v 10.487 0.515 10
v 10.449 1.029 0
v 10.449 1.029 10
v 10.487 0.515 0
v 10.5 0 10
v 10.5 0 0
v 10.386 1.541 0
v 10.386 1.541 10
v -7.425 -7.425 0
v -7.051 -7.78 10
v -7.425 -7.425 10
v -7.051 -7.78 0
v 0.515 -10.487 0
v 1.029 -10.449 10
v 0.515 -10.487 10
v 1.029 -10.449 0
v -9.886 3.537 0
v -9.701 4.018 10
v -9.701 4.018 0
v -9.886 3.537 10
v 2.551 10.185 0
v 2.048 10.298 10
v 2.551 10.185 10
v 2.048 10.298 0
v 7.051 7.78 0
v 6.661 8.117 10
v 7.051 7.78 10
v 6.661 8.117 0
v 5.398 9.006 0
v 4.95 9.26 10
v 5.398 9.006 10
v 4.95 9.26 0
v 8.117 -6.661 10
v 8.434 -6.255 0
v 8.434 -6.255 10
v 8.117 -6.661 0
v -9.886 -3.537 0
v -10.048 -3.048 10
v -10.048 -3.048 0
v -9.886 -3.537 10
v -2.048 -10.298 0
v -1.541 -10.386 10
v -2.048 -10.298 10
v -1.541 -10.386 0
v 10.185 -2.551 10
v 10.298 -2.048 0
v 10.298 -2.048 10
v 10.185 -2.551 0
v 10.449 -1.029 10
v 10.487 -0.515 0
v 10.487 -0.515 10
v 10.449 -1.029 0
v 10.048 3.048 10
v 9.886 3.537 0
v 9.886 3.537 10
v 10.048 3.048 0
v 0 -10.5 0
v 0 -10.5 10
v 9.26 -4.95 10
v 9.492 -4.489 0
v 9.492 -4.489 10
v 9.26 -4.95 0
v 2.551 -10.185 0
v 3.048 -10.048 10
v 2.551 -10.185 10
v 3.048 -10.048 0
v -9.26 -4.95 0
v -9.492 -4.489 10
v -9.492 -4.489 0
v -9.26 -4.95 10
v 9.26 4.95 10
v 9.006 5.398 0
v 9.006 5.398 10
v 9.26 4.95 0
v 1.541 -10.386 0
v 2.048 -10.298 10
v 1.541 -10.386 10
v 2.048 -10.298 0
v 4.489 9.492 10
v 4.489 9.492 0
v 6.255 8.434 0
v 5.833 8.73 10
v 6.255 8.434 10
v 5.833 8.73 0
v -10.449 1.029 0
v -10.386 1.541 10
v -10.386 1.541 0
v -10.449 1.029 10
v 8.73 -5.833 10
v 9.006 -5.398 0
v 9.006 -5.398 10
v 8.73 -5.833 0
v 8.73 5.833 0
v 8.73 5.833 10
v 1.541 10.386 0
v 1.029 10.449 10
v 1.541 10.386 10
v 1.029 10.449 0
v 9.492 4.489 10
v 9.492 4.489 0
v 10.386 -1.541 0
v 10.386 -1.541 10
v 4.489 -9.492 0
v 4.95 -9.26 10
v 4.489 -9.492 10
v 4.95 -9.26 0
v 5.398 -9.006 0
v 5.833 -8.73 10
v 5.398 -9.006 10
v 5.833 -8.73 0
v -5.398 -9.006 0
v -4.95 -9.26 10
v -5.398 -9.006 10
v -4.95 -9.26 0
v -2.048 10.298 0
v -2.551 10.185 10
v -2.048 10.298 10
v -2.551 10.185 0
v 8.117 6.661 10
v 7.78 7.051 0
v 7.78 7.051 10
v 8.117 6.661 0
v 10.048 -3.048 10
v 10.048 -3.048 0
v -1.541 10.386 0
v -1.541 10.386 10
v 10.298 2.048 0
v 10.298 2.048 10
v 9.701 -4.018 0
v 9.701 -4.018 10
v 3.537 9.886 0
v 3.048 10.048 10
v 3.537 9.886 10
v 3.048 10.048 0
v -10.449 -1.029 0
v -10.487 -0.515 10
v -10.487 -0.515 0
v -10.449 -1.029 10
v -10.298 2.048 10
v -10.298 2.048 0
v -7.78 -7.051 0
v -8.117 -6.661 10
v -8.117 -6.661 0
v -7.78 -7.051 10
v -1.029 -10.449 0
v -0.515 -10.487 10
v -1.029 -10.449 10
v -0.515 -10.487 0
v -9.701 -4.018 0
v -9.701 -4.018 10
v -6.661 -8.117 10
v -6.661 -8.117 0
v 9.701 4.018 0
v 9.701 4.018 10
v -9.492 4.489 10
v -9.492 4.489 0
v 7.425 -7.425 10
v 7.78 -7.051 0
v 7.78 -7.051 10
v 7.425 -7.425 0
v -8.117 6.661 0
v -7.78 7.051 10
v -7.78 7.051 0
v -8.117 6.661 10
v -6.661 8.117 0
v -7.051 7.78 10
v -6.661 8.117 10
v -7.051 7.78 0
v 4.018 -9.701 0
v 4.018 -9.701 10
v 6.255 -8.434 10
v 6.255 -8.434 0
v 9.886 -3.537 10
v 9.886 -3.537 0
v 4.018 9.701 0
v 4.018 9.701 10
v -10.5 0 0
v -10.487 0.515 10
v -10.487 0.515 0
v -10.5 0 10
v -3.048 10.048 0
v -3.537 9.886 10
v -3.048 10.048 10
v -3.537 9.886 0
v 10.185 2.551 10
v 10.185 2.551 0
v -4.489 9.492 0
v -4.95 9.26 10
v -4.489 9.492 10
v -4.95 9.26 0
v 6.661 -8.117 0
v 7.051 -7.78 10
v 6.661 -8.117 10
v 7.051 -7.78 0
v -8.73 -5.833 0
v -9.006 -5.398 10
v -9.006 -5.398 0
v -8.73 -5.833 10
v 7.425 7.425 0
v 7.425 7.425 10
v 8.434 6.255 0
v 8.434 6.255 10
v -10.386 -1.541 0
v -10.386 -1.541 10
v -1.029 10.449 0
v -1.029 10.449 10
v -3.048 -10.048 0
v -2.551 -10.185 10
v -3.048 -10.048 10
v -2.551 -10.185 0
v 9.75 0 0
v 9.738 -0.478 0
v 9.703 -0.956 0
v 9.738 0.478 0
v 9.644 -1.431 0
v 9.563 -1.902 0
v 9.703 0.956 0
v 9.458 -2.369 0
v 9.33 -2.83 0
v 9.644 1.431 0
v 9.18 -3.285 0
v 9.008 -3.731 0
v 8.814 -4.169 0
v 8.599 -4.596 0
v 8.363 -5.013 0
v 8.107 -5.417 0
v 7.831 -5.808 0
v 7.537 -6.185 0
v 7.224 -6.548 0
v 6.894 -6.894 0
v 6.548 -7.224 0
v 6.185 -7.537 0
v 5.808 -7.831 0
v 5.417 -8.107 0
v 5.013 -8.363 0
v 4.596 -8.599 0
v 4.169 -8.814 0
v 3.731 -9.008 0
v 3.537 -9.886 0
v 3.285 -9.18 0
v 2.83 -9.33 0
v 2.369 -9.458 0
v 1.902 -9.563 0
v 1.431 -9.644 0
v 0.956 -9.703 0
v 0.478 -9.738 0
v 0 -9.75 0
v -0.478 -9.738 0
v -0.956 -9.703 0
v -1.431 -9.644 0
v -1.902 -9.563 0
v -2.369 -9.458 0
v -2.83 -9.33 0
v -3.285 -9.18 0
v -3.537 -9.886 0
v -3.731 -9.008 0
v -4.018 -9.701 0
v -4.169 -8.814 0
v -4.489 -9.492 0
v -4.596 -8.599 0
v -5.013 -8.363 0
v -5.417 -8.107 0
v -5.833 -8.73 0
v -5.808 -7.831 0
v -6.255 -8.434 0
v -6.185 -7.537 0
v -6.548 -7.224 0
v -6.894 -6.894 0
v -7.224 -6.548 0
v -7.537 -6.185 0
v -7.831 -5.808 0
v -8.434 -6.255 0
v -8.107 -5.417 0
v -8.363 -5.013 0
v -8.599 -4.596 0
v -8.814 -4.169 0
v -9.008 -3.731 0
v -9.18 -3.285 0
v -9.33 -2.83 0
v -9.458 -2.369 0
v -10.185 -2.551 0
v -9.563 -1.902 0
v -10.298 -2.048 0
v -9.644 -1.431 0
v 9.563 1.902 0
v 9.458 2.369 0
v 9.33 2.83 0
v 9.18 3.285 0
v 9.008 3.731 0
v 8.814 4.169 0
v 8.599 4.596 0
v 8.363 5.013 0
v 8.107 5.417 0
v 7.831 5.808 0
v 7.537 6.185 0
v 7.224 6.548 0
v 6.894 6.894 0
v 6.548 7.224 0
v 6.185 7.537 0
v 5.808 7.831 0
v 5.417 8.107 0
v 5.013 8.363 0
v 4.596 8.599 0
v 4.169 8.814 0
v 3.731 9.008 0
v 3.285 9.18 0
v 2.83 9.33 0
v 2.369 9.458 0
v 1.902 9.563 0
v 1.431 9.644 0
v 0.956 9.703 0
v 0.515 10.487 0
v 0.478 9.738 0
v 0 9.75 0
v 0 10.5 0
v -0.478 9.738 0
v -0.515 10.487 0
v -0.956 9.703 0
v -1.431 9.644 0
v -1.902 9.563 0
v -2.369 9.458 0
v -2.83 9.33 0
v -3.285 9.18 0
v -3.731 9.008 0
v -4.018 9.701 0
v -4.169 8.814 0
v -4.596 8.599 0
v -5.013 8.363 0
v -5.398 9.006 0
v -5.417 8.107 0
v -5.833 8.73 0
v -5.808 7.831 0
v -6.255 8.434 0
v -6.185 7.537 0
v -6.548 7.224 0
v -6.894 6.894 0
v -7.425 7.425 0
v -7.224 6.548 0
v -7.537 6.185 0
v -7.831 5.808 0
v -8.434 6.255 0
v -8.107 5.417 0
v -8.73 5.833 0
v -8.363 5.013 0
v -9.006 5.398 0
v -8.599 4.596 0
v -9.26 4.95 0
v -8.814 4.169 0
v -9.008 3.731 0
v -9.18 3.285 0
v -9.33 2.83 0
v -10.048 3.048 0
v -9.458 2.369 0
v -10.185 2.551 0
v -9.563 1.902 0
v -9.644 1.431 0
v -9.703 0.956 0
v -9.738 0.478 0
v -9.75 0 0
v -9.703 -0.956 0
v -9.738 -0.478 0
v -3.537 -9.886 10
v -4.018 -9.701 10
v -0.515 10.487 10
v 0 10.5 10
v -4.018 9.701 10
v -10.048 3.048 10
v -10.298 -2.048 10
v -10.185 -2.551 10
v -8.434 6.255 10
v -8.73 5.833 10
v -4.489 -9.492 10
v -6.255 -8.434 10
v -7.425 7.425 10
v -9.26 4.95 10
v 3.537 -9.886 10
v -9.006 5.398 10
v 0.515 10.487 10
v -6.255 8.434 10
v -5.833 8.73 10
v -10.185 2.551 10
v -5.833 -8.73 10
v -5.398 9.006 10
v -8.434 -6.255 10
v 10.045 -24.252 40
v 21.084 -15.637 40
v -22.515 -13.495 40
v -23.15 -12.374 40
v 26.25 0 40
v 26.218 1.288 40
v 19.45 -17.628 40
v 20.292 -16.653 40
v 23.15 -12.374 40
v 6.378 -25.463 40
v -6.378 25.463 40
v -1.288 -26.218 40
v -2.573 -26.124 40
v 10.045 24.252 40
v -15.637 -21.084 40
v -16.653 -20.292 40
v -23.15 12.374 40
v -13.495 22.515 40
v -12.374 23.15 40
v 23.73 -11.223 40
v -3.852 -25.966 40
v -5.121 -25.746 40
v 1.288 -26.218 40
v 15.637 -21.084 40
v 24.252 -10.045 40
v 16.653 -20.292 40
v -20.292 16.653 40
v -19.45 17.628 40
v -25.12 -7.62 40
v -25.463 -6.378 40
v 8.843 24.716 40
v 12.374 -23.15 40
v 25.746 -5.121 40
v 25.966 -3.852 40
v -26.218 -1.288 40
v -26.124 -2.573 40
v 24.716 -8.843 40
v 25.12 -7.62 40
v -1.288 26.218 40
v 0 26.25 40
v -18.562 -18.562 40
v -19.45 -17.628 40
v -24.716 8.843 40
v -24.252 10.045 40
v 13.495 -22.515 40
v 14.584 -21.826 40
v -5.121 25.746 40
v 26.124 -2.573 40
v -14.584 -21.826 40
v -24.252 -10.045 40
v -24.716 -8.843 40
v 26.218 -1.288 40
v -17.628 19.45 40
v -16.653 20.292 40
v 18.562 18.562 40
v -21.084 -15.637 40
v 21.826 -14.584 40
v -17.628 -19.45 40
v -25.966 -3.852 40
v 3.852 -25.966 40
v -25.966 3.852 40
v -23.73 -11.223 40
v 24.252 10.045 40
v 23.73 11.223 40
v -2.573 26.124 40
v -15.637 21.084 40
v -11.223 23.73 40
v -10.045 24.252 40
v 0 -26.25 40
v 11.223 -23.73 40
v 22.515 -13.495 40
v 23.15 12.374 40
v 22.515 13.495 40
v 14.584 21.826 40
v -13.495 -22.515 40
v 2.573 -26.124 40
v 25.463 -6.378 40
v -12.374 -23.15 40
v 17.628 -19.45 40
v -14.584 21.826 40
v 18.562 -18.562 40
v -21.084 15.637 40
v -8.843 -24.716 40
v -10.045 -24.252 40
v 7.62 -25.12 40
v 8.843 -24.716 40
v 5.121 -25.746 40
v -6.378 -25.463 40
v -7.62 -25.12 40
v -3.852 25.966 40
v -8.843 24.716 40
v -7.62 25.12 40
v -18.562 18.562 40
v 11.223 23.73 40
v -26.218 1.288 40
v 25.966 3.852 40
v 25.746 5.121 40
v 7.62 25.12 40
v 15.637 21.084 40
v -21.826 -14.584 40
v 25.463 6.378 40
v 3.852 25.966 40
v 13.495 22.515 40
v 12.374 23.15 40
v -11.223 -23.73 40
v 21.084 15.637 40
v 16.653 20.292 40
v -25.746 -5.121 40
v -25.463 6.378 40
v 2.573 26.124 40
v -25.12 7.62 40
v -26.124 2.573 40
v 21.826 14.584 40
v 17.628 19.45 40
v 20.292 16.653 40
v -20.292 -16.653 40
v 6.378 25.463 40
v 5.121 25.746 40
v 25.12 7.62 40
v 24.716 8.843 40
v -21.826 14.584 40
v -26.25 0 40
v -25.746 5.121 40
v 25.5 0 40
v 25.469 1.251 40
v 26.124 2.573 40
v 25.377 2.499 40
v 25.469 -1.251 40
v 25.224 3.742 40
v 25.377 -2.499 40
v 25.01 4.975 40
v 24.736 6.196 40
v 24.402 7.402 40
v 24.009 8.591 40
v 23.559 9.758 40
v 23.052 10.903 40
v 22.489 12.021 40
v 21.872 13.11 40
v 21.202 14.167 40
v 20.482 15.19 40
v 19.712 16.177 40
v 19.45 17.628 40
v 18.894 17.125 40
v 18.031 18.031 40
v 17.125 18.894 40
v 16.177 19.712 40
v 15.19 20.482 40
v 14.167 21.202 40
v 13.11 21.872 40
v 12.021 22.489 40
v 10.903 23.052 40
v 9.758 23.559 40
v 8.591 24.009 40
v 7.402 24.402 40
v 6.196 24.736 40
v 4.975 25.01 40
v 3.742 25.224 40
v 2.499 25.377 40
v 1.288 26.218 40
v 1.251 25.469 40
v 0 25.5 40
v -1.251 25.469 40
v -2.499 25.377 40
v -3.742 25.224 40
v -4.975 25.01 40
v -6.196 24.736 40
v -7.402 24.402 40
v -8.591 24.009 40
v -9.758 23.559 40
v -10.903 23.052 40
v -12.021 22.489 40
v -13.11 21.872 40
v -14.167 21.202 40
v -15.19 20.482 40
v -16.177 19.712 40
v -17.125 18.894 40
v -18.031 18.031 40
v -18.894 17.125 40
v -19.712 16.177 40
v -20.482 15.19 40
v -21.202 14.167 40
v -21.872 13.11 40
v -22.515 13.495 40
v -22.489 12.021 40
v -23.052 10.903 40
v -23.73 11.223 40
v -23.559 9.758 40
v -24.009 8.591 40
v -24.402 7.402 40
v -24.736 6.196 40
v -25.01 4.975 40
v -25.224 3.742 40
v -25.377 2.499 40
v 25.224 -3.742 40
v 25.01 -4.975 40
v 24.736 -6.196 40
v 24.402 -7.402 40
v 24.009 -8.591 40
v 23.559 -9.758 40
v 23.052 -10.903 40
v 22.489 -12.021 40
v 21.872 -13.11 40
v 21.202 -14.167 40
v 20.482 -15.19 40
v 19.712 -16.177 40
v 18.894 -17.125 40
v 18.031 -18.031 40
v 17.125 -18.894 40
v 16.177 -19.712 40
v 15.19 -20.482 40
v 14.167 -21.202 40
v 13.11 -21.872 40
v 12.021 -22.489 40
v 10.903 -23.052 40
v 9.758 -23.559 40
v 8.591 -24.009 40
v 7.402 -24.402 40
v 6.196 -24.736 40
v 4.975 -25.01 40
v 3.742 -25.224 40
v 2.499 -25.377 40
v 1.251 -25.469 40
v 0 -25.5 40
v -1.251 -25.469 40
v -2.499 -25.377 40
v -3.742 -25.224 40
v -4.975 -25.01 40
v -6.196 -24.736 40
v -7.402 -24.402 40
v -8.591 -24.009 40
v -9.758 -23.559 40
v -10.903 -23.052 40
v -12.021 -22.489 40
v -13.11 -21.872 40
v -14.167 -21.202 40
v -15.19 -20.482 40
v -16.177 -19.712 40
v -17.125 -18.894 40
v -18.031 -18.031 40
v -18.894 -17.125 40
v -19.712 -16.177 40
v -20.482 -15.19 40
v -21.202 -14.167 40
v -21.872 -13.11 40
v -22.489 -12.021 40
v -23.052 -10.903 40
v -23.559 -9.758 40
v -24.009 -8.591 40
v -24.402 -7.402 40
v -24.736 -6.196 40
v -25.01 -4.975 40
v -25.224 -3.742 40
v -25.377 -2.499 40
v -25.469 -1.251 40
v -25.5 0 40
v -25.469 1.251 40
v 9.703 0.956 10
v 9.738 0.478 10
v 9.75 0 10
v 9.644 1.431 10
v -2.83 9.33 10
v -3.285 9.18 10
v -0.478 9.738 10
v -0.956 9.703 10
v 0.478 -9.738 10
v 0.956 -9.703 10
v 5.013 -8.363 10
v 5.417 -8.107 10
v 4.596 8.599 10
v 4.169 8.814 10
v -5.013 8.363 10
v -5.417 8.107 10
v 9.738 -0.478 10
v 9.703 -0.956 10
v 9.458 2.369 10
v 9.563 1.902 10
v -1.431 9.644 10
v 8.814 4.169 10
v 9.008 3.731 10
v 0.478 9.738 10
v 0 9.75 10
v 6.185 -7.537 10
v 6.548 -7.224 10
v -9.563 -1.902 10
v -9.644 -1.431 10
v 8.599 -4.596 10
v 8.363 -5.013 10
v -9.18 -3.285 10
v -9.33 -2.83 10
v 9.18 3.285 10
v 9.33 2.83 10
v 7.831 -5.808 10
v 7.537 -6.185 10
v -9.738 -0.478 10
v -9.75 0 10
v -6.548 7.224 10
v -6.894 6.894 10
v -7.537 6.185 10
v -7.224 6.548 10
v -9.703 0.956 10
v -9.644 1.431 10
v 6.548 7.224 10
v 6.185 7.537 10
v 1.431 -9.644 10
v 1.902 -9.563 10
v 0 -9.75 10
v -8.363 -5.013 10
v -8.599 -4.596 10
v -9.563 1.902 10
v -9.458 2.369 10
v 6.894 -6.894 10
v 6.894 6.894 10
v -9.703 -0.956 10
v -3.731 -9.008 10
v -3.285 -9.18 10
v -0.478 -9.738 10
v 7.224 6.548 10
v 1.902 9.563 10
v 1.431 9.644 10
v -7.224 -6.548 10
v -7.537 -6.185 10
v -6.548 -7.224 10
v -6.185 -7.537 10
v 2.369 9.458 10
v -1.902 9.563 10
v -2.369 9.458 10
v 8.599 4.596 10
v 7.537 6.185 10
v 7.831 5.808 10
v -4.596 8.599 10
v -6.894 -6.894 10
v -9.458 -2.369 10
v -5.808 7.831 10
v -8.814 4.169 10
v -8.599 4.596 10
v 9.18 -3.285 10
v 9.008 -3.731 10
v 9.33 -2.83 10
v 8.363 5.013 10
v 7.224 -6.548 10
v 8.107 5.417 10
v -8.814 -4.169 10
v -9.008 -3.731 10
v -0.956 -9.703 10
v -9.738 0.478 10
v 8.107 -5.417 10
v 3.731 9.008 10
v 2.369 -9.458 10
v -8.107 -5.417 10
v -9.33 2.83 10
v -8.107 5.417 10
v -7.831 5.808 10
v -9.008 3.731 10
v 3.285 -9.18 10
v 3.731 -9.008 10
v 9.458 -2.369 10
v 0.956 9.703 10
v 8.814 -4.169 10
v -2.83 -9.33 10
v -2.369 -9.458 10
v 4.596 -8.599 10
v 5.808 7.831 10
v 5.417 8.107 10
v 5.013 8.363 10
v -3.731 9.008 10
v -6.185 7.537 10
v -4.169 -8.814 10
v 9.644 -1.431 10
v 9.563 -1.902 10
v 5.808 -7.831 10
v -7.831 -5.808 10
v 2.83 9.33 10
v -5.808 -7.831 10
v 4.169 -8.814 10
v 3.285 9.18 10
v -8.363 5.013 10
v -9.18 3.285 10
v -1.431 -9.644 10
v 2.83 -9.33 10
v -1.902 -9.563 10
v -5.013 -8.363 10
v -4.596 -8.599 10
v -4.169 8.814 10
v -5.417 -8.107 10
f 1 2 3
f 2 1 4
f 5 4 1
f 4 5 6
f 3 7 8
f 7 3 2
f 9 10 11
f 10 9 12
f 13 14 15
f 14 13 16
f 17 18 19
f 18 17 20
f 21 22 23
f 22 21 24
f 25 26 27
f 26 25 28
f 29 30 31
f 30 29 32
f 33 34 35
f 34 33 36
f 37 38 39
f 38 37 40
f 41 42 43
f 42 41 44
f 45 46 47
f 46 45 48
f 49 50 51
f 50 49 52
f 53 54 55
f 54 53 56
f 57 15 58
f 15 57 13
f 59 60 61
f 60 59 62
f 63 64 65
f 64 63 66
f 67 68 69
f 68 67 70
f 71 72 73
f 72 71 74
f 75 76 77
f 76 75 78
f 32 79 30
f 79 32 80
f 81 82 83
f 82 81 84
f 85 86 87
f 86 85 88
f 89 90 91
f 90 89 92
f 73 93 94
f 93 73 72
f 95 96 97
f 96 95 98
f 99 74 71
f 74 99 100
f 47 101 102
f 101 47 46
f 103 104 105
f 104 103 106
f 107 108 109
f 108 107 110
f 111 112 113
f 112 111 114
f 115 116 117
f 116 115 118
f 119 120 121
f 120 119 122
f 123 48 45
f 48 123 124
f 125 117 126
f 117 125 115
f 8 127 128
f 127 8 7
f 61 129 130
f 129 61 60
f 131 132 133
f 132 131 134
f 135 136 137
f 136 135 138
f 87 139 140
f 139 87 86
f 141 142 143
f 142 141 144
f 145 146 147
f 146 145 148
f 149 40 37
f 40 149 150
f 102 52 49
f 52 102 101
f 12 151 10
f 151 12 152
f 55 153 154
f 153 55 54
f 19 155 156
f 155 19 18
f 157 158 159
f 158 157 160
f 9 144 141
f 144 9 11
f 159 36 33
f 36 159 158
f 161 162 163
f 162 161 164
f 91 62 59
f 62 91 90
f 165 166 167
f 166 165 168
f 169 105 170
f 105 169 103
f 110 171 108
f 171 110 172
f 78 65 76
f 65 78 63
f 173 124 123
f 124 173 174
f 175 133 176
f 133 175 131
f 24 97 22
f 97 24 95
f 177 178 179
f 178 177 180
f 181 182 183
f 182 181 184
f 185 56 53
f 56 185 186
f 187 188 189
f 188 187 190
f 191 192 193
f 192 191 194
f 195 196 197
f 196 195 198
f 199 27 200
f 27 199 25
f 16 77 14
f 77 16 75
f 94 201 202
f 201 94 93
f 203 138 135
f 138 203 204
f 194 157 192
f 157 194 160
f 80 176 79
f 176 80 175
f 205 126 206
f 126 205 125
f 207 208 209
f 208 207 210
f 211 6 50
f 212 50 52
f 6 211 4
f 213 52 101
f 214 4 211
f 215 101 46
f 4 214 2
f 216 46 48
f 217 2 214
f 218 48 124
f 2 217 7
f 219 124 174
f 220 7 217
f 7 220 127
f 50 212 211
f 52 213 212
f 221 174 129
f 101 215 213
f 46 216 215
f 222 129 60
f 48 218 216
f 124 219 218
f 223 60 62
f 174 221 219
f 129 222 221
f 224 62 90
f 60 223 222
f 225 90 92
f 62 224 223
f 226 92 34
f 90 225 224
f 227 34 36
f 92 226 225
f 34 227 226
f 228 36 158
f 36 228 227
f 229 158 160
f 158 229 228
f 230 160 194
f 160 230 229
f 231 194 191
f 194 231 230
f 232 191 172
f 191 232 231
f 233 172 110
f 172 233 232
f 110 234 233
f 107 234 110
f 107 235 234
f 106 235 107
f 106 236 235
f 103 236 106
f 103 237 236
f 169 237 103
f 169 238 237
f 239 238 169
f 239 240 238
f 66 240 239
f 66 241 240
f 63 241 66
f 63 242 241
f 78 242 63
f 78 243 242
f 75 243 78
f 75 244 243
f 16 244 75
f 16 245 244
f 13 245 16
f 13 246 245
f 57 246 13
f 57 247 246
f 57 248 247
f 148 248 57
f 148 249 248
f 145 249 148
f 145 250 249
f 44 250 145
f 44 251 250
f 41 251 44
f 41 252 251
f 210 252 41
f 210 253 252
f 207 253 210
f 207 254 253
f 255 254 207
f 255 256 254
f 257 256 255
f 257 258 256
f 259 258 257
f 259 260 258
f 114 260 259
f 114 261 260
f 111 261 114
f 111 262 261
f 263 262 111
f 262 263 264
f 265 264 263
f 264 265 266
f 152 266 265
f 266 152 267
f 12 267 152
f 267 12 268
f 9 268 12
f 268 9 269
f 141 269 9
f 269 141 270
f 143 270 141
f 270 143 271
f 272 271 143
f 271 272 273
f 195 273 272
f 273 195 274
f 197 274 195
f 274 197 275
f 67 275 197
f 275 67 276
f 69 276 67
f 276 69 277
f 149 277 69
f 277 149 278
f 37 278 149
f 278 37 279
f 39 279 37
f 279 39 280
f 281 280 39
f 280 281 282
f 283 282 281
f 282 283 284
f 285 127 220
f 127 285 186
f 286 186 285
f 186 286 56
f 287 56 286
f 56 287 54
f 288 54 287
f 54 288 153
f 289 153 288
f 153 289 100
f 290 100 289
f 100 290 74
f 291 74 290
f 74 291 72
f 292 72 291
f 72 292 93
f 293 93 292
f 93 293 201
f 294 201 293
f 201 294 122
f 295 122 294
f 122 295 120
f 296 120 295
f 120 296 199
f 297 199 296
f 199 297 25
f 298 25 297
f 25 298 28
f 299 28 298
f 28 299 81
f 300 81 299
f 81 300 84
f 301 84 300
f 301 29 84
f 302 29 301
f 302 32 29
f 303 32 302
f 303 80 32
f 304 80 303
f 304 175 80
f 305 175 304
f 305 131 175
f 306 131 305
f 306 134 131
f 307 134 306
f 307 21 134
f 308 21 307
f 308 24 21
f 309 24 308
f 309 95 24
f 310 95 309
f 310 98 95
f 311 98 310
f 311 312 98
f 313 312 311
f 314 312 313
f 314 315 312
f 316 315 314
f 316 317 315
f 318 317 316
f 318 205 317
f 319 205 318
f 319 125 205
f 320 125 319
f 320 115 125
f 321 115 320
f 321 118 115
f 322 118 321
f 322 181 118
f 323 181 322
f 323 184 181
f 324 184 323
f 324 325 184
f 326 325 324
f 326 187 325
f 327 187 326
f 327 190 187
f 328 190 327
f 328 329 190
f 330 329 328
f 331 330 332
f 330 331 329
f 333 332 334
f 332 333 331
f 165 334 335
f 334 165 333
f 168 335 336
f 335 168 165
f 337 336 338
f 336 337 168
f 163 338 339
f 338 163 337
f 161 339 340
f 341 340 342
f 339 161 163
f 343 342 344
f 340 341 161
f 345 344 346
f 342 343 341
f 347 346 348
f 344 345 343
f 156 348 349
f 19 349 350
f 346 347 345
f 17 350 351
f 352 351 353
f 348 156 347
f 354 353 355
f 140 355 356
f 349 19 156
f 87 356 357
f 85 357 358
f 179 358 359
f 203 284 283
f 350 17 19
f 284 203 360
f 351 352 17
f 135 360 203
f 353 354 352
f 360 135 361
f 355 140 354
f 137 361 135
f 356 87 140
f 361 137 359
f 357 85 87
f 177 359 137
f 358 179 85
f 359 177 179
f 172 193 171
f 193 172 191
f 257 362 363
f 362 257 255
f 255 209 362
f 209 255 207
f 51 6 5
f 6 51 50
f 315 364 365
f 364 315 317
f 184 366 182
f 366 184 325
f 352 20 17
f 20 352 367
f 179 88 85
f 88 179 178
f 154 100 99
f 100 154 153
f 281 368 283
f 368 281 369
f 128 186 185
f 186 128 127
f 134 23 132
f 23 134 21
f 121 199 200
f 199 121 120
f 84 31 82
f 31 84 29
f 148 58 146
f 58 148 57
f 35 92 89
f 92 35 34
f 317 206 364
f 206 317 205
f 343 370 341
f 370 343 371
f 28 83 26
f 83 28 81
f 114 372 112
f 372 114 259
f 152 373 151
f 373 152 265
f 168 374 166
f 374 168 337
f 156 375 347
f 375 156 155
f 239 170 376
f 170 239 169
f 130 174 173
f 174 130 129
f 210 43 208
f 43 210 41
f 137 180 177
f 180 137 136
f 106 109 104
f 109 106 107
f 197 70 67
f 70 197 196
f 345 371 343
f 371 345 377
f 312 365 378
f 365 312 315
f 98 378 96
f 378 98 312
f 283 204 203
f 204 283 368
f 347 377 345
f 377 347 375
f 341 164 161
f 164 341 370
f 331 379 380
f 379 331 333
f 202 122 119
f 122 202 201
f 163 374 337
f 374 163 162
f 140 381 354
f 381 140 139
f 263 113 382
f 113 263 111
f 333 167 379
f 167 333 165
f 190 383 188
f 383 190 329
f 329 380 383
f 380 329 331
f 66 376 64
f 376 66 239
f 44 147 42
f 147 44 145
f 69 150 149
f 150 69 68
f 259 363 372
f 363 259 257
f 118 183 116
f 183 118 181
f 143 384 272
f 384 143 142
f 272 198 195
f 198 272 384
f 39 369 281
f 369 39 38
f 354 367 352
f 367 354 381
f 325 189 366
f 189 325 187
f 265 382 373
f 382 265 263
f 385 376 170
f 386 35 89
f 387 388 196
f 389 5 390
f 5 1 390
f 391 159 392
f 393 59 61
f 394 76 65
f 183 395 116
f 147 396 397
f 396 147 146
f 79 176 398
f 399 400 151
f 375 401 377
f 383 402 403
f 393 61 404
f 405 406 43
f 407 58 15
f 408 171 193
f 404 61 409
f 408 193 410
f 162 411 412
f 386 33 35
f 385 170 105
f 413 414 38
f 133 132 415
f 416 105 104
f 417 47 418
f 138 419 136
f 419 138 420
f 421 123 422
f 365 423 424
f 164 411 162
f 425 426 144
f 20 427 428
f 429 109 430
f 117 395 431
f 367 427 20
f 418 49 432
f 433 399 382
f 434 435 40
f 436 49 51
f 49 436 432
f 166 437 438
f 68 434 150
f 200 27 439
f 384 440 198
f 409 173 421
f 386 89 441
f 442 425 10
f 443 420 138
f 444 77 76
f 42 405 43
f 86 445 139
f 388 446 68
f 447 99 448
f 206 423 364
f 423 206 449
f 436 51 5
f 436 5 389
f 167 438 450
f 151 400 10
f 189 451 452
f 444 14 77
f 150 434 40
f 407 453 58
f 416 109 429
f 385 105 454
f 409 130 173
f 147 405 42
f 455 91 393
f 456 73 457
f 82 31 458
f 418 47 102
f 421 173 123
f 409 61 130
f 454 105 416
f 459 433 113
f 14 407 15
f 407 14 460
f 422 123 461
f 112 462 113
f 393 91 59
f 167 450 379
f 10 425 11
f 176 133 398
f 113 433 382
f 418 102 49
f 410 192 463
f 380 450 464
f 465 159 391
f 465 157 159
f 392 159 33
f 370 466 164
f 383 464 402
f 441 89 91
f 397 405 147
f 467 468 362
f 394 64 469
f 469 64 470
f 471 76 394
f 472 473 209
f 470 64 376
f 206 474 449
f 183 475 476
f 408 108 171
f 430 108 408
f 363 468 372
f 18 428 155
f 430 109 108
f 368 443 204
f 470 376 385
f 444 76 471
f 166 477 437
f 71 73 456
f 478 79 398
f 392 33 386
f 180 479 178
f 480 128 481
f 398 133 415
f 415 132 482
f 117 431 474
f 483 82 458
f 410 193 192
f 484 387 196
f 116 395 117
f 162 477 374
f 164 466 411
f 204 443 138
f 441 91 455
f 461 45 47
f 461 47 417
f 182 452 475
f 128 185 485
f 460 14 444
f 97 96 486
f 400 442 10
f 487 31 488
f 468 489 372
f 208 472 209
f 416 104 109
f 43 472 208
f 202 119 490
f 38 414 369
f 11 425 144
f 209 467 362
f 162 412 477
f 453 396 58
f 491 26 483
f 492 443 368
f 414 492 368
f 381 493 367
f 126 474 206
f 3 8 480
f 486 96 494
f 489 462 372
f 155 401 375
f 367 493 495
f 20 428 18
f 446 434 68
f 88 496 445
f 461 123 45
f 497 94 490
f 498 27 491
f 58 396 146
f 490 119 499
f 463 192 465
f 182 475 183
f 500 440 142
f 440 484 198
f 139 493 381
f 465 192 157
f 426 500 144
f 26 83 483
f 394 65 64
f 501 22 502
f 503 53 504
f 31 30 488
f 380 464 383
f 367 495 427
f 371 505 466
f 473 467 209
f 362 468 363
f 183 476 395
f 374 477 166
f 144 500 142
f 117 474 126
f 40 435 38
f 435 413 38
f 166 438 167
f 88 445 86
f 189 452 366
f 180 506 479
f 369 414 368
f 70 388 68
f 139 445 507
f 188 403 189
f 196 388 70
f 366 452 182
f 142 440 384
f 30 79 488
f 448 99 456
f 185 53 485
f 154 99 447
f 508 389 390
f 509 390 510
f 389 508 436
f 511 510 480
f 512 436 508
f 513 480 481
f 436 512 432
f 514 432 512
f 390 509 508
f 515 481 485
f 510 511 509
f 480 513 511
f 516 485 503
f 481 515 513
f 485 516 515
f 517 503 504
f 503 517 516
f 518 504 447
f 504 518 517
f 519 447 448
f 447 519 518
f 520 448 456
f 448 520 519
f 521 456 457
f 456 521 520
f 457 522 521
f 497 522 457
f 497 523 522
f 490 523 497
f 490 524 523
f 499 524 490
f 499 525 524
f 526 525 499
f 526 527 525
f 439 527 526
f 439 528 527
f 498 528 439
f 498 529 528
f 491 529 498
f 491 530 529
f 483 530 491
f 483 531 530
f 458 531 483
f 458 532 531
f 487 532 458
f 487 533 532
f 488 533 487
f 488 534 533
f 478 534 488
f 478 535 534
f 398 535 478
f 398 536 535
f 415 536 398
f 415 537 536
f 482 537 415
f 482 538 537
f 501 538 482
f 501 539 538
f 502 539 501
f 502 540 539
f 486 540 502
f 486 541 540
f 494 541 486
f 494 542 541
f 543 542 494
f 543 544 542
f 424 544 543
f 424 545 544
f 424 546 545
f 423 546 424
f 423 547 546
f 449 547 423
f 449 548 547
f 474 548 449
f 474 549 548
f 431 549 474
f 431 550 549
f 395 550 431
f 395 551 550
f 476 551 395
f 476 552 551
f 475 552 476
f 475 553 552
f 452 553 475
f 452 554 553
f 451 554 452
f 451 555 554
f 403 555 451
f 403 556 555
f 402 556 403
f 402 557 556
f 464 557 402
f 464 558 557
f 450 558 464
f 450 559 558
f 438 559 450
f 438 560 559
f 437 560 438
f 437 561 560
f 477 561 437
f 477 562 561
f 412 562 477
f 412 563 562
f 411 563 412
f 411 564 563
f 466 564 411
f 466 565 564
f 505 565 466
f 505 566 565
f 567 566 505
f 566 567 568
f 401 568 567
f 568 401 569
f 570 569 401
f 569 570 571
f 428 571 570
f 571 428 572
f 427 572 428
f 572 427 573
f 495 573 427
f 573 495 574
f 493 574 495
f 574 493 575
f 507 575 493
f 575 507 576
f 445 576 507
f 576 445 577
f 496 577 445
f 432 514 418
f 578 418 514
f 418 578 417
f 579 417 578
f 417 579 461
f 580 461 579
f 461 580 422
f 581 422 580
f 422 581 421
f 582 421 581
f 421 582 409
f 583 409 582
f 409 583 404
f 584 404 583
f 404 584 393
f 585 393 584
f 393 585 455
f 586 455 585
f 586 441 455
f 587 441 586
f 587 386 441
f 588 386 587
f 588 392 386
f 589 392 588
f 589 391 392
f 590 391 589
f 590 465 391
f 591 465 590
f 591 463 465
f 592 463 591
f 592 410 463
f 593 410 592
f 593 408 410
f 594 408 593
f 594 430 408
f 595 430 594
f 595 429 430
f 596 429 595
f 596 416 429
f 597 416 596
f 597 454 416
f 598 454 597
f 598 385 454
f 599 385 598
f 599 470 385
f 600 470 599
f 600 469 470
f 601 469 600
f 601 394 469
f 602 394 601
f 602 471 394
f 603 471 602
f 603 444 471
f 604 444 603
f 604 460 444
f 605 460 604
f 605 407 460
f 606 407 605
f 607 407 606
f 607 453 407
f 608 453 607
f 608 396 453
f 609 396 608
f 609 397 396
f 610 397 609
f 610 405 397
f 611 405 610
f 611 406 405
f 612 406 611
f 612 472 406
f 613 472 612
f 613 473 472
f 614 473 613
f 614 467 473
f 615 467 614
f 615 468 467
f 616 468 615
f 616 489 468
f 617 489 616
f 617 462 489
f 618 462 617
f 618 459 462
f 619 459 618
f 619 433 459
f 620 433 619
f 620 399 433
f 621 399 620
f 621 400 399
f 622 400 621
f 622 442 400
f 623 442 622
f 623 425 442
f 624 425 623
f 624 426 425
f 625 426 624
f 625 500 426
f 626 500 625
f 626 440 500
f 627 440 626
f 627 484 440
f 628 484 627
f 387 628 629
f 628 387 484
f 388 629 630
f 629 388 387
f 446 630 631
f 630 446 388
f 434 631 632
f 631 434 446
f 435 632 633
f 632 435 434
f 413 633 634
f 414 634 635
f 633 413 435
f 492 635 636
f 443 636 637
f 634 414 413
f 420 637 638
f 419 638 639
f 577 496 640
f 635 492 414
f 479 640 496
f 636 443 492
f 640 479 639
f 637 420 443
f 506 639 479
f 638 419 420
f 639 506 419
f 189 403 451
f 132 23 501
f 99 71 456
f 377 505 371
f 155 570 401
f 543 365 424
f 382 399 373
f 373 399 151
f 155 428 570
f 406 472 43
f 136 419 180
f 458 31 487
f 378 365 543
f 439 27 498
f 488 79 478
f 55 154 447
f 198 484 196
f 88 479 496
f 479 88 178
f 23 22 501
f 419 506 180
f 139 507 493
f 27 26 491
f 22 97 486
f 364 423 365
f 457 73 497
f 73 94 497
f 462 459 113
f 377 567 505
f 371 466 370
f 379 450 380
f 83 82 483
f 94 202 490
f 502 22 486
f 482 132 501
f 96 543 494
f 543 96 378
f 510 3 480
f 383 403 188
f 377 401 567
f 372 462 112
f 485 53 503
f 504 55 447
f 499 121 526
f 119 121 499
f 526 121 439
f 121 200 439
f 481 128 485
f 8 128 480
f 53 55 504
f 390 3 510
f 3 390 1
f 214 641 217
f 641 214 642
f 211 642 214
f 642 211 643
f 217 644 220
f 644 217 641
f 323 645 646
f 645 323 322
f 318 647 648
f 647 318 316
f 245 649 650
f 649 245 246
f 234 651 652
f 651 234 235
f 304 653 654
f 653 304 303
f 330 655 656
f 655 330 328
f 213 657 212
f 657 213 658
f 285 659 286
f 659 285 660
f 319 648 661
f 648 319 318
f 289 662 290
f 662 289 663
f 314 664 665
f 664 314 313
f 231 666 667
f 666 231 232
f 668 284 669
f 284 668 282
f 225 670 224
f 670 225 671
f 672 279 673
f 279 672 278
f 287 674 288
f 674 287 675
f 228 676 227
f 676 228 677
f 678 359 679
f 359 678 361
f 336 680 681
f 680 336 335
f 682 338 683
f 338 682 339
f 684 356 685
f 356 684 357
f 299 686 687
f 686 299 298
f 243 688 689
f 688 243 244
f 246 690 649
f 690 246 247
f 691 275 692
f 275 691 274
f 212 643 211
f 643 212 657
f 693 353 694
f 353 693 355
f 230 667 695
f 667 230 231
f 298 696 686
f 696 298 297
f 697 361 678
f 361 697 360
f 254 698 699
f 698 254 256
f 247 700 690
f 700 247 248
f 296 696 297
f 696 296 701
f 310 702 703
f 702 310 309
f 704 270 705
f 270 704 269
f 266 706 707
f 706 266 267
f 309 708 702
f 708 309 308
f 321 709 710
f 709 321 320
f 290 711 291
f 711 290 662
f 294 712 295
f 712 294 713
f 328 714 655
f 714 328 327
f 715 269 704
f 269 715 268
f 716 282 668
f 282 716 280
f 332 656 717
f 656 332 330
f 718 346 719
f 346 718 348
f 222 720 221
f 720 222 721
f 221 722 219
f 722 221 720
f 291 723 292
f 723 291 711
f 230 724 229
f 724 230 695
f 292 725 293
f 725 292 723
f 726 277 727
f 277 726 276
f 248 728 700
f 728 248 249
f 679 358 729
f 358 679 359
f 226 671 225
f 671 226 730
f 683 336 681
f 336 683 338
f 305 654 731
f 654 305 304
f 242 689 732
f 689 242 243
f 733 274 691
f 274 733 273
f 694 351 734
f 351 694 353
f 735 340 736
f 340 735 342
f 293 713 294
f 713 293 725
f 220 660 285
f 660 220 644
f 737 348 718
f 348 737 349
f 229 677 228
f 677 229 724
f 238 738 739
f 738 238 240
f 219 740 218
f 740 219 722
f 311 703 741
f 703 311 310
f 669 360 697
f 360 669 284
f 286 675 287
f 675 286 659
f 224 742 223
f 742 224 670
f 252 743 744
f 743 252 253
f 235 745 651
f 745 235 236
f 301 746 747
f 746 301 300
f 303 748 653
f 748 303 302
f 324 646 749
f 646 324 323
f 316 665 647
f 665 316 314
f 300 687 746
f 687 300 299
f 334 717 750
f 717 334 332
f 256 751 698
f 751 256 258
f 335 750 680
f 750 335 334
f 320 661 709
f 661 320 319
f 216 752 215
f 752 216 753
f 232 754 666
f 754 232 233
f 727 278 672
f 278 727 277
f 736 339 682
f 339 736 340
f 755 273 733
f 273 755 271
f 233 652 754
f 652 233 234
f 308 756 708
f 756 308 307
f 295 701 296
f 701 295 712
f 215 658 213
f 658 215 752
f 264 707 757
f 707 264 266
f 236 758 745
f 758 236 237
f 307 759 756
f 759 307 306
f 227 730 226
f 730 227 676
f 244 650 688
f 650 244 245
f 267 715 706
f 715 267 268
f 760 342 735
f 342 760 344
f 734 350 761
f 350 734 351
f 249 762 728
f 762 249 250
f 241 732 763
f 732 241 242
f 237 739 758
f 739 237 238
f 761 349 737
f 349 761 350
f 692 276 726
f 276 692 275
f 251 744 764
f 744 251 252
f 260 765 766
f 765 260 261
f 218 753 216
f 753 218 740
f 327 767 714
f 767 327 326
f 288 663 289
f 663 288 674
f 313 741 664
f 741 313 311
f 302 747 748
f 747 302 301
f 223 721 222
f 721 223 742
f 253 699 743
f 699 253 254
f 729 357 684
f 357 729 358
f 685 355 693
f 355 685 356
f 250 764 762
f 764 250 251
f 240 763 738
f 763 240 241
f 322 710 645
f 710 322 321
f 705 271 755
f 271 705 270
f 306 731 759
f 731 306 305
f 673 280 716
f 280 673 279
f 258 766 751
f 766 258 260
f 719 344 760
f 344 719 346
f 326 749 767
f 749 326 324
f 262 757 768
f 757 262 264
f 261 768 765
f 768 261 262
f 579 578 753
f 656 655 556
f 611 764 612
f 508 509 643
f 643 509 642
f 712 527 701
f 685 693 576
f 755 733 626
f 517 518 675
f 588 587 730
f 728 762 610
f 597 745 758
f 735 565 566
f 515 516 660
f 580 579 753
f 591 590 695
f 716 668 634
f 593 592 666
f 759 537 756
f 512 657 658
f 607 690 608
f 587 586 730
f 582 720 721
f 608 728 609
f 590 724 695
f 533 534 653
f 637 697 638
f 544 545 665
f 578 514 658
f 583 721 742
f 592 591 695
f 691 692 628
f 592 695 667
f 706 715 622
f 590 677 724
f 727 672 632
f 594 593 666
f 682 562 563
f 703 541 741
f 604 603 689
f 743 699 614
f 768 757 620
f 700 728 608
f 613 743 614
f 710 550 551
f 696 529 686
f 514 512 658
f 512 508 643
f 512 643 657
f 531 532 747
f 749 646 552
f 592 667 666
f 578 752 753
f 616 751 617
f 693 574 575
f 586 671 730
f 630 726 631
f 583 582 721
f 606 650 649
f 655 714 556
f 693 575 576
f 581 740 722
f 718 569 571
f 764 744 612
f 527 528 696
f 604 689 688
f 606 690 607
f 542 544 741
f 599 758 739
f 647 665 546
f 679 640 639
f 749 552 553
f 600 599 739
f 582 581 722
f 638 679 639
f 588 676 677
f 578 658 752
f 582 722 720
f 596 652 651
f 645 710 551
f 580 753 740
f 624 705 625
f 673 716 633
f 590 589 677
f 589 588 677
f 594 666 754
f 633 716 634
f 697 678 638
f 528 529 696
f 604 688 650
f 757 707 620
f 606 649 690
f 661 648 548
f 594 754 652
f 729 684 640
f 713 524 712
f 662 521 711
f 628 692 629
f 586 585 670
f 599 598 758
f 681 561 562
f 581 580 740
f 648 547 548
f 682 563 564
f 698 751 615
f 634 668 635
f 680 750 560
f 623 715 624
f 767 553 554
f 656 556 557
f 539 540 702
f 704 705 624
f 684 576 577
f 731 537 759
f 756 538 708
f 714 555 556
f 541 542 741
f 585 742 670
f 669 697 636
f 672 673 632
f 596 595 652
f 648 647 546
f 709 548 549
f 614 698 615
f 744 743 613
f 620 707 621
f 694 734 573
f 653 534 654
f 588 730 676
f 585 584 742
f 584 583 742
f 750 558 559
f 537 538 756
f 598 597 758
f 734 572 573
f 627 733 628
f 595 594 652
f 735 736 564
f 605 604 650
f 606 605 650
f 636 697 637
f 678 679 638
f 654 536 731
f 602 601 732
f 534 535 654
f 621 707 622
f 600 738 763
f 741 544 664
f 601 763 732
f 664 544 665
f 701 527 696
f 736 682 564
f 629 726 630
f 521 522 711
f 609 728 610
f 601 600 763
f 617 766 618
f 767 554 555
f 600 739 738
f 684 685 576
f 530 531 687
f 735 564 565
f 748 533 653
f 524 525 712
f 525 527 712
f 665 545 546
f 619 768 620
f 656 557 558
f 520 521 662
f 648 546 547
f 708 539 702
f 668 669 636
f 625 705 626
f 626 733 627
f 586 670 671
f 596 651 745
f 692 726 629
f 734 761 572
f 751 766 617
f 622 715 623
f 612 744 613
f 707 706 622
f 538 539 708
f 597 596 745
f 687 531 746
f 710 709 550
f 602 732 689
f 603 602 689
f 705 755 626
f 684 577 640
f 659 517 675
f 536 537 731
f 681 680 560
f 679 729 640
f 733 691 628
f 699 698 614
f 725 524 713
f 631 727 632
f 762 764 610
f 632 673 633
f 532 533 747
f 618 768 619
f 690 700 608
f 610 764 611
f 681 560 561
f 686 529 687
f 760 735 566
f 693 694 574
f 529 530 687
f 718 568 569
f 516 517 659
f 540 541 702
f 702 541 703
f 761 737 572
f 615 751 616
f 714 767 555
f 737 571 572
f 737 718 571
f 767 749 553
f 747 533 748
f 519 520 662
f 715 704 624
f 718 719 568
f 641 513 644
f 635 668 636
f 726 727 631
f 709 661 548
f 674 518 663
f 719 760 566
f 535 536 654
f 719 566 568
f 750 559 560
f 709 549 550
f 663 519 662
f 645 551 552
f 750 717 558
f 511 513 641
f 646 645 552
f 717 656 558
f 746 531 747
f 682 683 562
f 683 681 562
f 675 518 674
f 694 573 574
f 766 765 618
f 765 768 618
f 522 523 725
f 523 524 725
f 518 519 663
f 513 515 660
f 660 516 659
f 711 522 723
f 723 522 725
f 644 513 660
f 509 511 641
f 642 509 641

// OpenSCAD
br = 22/2-0.5;
fr = br * 2.5;
fh = 30;
ph = 10;
pw = 4.4+0.5;
ww = 1.5;
zf = 1;

$fn = 128;

module funnel() {
    difference() {
        union() {
            cylinder(r=br, h=ph);
            translate([0,0,ph]) cylinder(r1=br, r2=fr, h=fh);
        }
        union() {
            translate([0,0,-zf]) cylinder(r=br-ww/2, h=ph+2*zf);
            translate([0,0,ph]) cylinder(r1=br-ww/2, r2=fr-ww/2, h=fh);
        }
    }
}

funnel();
